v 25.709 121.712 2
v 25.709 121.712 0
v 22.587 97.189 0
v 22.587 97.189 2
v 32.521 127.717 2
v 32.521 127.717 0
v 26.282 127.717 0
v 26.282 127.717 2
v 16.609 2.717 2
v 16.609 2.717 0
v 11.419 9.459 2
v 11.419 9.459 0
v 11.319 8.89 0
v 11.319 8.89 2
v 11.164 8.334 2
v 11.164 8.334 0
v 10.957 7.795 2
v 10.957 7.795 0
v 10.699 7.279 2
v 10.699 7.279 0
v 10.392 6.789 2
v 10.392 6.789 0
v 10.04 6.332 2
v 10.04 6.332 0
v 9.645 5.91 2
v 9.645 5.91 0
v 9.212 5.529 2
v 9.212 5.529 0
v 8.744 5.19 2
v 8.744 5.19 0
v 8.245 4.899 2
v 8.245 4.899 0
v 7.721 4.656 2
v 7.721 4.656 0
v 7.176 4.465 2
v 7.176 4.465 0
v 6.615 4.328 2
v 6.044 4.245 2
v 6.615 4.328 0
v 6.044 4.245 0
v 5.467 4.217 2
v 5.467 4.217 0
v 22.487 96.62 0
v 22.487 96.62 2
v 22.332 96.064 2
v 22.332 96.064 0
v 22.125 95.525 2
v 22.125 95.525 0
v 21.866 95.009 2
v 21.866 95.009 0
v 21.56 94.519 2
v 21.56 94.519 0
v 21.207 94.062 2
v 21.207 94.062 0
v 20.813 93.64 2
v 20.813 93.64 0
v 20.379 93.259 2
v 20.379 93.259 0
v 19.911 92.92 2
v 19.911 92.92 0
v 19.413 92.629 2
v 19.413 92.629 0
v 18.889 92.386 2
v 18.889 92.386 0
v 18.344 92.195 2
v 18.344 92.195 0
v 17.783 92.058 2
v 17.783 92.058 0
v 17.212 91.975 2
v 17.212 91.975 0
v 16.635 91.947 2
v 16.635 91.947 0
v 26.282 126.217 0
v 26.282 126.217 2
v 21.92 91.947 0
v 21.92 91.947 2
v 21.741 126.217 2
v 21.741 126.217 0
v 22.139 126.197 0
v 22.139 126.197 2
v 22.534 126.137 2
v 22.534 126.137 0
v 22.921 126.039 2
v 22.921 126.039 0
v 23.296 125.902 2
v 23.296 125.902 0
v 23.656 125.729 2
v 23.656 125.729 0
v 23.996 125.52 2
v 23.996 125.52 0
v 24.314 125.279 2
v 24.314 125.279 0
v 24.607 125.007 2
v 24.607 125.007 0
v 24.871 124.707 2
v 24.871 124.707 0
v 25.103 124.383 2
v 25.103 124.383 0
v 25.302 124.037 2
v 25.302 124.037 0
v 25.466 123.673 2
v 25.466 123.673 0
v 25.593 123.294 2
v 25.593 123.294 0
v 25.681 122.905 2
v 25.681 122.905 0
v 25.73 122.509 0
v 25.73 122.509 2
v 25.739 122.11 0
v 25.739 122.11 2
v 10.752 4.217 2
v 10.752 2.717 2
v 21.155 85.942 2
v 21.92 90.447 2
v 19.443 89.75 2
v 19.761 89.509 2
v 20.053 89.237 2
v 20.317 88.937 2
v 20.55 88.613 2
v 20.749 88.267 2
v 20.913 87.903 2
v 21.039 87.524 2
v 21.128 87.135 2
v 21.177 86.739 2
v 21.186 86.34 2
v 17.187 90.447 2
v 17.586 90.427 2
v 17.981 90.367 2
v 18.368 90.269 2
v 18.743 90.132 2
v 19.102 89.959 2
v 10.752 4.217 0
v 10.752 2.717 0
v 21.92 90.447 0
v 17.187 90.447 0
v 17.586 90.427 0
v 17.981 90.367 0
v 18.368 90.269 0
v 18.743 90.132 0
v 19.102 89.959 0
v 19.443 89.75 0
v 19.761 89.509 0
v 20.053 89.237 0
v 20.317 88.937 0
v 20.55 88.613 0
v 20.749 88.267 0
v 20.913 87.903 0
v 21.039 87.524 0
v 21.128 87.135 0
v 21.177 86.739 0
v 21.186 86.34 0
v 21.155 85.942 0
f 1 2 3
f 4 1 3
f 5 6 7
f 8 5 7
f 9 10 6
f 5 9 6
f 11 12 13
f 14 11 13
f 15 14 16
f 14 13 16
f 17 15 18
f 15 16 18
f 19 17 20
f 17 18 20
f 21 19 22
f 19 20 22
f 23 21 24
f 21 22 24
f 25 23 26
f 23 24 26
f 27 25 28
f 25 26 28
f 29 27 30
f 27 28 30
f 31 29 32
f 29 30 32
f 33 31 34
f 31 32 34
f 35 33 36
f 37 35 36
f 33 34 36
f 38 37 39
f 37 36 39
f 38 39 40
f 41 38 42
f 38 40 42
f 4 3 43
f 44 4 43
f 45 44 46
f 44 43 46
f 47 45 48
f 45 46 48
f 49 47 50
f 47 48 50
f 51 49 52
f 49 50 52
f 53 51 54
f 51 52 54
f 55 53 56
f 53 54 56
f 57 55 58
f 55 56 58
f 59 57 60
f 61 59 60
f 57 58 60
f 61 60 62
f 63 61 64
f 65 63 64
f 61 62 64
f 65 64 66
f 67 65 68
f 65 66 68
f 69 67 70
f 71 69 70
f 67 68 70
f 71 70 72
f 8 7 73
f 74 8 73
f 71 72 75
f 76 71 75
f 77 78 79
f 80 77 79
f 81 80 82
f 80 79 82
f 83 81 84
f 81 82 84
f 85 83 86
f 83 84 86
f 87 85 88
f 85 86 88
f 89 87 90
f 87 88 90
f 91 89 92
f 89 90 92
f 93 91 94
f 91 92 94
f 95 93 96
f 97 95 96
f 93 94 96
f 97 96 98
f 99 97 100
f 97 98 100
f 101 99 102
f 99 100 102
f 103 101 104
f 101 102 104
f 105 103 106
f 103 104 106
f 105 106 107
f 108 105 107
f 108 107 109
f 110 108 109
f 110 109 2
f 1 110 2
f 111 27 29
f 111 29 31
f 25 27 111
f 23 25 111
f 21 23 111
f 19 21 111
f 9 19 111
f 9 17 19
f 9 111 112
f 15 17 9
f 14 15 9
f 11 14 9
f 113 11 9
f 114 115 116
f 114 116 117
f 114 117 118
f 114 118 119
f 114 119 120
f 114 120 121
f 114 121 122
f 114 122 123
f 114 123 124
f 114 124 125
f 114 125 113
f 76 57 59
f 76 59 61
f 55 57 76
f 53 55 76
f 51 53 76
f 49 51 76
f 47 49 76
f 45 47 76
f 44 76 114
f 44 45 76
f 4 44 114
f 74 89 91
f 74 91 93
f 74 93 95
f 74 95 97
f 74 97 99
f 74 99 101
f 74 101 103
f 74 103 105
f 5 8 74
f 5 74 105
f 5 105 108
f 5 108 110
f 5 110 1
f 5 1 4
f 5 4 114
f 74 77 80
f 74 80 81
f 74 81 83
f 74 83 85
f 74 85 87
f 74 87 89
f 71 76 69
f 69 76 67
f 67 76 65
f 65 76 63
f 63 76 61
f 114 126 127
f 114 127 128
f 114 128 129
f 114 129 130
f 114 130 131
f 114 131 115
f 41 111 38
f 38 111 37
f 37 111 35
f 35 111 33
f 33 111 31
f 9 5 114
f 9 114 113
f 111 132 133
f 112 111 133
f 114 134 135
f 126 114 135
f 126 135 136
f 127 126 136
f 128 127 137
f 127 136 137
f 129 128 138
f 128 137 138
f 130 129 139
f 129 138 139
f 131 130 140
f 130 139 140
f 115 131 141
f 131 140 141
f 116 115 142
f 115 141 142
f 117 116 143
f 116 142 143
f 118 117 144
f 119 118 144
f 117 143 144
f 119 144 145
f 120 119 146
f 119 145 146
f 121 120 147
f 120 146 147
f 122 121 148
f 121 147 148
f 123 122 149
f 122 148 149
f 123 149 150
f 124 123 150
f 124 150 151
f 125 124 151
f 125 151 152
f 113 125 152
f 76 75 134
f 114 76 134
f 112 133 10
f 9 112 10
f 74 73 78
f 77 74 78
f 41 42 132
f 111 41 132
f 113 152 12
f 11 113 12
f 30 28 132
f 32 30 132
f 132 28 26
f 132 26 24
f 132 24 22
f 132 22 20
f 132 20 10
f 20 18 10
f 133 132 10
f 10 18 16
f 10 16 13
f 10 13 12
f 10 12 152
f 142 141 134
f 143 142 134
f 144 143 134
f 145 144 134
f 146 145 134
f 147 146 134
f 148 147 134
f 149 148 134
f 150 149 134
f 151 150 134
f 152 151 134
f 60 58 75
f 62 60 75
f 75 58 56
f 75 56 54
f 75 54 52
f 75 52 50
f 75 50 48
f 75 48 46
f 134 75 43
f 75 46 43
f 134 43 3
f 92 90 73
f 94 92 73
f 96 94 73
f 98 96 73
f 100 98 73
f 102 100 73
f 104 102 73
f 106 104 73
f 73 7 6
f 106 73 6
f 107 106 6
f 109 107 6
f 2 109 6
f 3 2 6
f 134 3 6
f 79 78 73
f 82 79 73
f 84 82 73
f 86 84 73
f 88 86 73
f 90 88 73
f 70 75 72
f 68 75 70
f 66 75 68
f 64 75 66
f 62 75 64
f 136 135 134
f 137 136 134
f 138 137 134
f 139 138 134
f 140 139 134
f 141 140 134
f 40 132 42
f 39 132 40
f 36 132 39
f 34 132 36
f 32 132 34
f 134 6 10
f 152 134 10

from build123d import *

# Parameters (mm, degrees)
EXTRUDE_1_DEPTH = 2


with BuildPart() as part:
    # 草图1 → 凸台-拉伸1 (new body)
    with BuildSketch(Plane.XY):
        with BuildLine():
            Line((32.521472611, 127.716716237), (26.282107631, 127.716716237))
            Line((26.282107631, 127.716716237), (26.282107631, 126.216716237))
            Line((26.282107631, 126.216716237), (21.740638301, 126.216716237))
            ThreePointArc((21.740638301, 126.216716237), (24.74234251, 124.860533901), (25.708617606, 121.711602158))
            Line((25.708617606, 121.711602158), (22.586955956, 97.189045118))
            ThreePointArc((22.586955956, 97.189045118), (20.600713495, 93.444159924), (16.634986998, 91.946716237))
            Line((16.634986998, 91.946716237), (21.919620287, 91.946716237))
            Line((21.919620287, 91.946716237), (21.919620287, 90.446716237))
            Line((21.919620287, 90.446716237), (17.187204618, 90.446716237))
            ThreePointArc((17.187204618, 90.446716237), (20.188908827, 89.090533901), (21.155183923, 85.941602158))
            Line((21.155183923, 85.941602158), (11.419141111, 9.459045118))
            ThreePointArc((11.419141111, 9.459045118), (9.43289865, 5.714159924), (5.467172154, 4.216716237))
            Line((5.467172154, 4.216716237), (10.751805442, 4.216716237))
            Line((10.751805442, 4.216716237), (10.751805442, 2.716716237))
            Line((10.751805442, 2.716716237), (16.609277745, 2.716716237))
            Line((16.609277745, 2.716716237), (32.521472611, 127.716716237))
        make_face()
    extrude(amount=EXTRUDE_1_DEPTH)


solid = part.part
